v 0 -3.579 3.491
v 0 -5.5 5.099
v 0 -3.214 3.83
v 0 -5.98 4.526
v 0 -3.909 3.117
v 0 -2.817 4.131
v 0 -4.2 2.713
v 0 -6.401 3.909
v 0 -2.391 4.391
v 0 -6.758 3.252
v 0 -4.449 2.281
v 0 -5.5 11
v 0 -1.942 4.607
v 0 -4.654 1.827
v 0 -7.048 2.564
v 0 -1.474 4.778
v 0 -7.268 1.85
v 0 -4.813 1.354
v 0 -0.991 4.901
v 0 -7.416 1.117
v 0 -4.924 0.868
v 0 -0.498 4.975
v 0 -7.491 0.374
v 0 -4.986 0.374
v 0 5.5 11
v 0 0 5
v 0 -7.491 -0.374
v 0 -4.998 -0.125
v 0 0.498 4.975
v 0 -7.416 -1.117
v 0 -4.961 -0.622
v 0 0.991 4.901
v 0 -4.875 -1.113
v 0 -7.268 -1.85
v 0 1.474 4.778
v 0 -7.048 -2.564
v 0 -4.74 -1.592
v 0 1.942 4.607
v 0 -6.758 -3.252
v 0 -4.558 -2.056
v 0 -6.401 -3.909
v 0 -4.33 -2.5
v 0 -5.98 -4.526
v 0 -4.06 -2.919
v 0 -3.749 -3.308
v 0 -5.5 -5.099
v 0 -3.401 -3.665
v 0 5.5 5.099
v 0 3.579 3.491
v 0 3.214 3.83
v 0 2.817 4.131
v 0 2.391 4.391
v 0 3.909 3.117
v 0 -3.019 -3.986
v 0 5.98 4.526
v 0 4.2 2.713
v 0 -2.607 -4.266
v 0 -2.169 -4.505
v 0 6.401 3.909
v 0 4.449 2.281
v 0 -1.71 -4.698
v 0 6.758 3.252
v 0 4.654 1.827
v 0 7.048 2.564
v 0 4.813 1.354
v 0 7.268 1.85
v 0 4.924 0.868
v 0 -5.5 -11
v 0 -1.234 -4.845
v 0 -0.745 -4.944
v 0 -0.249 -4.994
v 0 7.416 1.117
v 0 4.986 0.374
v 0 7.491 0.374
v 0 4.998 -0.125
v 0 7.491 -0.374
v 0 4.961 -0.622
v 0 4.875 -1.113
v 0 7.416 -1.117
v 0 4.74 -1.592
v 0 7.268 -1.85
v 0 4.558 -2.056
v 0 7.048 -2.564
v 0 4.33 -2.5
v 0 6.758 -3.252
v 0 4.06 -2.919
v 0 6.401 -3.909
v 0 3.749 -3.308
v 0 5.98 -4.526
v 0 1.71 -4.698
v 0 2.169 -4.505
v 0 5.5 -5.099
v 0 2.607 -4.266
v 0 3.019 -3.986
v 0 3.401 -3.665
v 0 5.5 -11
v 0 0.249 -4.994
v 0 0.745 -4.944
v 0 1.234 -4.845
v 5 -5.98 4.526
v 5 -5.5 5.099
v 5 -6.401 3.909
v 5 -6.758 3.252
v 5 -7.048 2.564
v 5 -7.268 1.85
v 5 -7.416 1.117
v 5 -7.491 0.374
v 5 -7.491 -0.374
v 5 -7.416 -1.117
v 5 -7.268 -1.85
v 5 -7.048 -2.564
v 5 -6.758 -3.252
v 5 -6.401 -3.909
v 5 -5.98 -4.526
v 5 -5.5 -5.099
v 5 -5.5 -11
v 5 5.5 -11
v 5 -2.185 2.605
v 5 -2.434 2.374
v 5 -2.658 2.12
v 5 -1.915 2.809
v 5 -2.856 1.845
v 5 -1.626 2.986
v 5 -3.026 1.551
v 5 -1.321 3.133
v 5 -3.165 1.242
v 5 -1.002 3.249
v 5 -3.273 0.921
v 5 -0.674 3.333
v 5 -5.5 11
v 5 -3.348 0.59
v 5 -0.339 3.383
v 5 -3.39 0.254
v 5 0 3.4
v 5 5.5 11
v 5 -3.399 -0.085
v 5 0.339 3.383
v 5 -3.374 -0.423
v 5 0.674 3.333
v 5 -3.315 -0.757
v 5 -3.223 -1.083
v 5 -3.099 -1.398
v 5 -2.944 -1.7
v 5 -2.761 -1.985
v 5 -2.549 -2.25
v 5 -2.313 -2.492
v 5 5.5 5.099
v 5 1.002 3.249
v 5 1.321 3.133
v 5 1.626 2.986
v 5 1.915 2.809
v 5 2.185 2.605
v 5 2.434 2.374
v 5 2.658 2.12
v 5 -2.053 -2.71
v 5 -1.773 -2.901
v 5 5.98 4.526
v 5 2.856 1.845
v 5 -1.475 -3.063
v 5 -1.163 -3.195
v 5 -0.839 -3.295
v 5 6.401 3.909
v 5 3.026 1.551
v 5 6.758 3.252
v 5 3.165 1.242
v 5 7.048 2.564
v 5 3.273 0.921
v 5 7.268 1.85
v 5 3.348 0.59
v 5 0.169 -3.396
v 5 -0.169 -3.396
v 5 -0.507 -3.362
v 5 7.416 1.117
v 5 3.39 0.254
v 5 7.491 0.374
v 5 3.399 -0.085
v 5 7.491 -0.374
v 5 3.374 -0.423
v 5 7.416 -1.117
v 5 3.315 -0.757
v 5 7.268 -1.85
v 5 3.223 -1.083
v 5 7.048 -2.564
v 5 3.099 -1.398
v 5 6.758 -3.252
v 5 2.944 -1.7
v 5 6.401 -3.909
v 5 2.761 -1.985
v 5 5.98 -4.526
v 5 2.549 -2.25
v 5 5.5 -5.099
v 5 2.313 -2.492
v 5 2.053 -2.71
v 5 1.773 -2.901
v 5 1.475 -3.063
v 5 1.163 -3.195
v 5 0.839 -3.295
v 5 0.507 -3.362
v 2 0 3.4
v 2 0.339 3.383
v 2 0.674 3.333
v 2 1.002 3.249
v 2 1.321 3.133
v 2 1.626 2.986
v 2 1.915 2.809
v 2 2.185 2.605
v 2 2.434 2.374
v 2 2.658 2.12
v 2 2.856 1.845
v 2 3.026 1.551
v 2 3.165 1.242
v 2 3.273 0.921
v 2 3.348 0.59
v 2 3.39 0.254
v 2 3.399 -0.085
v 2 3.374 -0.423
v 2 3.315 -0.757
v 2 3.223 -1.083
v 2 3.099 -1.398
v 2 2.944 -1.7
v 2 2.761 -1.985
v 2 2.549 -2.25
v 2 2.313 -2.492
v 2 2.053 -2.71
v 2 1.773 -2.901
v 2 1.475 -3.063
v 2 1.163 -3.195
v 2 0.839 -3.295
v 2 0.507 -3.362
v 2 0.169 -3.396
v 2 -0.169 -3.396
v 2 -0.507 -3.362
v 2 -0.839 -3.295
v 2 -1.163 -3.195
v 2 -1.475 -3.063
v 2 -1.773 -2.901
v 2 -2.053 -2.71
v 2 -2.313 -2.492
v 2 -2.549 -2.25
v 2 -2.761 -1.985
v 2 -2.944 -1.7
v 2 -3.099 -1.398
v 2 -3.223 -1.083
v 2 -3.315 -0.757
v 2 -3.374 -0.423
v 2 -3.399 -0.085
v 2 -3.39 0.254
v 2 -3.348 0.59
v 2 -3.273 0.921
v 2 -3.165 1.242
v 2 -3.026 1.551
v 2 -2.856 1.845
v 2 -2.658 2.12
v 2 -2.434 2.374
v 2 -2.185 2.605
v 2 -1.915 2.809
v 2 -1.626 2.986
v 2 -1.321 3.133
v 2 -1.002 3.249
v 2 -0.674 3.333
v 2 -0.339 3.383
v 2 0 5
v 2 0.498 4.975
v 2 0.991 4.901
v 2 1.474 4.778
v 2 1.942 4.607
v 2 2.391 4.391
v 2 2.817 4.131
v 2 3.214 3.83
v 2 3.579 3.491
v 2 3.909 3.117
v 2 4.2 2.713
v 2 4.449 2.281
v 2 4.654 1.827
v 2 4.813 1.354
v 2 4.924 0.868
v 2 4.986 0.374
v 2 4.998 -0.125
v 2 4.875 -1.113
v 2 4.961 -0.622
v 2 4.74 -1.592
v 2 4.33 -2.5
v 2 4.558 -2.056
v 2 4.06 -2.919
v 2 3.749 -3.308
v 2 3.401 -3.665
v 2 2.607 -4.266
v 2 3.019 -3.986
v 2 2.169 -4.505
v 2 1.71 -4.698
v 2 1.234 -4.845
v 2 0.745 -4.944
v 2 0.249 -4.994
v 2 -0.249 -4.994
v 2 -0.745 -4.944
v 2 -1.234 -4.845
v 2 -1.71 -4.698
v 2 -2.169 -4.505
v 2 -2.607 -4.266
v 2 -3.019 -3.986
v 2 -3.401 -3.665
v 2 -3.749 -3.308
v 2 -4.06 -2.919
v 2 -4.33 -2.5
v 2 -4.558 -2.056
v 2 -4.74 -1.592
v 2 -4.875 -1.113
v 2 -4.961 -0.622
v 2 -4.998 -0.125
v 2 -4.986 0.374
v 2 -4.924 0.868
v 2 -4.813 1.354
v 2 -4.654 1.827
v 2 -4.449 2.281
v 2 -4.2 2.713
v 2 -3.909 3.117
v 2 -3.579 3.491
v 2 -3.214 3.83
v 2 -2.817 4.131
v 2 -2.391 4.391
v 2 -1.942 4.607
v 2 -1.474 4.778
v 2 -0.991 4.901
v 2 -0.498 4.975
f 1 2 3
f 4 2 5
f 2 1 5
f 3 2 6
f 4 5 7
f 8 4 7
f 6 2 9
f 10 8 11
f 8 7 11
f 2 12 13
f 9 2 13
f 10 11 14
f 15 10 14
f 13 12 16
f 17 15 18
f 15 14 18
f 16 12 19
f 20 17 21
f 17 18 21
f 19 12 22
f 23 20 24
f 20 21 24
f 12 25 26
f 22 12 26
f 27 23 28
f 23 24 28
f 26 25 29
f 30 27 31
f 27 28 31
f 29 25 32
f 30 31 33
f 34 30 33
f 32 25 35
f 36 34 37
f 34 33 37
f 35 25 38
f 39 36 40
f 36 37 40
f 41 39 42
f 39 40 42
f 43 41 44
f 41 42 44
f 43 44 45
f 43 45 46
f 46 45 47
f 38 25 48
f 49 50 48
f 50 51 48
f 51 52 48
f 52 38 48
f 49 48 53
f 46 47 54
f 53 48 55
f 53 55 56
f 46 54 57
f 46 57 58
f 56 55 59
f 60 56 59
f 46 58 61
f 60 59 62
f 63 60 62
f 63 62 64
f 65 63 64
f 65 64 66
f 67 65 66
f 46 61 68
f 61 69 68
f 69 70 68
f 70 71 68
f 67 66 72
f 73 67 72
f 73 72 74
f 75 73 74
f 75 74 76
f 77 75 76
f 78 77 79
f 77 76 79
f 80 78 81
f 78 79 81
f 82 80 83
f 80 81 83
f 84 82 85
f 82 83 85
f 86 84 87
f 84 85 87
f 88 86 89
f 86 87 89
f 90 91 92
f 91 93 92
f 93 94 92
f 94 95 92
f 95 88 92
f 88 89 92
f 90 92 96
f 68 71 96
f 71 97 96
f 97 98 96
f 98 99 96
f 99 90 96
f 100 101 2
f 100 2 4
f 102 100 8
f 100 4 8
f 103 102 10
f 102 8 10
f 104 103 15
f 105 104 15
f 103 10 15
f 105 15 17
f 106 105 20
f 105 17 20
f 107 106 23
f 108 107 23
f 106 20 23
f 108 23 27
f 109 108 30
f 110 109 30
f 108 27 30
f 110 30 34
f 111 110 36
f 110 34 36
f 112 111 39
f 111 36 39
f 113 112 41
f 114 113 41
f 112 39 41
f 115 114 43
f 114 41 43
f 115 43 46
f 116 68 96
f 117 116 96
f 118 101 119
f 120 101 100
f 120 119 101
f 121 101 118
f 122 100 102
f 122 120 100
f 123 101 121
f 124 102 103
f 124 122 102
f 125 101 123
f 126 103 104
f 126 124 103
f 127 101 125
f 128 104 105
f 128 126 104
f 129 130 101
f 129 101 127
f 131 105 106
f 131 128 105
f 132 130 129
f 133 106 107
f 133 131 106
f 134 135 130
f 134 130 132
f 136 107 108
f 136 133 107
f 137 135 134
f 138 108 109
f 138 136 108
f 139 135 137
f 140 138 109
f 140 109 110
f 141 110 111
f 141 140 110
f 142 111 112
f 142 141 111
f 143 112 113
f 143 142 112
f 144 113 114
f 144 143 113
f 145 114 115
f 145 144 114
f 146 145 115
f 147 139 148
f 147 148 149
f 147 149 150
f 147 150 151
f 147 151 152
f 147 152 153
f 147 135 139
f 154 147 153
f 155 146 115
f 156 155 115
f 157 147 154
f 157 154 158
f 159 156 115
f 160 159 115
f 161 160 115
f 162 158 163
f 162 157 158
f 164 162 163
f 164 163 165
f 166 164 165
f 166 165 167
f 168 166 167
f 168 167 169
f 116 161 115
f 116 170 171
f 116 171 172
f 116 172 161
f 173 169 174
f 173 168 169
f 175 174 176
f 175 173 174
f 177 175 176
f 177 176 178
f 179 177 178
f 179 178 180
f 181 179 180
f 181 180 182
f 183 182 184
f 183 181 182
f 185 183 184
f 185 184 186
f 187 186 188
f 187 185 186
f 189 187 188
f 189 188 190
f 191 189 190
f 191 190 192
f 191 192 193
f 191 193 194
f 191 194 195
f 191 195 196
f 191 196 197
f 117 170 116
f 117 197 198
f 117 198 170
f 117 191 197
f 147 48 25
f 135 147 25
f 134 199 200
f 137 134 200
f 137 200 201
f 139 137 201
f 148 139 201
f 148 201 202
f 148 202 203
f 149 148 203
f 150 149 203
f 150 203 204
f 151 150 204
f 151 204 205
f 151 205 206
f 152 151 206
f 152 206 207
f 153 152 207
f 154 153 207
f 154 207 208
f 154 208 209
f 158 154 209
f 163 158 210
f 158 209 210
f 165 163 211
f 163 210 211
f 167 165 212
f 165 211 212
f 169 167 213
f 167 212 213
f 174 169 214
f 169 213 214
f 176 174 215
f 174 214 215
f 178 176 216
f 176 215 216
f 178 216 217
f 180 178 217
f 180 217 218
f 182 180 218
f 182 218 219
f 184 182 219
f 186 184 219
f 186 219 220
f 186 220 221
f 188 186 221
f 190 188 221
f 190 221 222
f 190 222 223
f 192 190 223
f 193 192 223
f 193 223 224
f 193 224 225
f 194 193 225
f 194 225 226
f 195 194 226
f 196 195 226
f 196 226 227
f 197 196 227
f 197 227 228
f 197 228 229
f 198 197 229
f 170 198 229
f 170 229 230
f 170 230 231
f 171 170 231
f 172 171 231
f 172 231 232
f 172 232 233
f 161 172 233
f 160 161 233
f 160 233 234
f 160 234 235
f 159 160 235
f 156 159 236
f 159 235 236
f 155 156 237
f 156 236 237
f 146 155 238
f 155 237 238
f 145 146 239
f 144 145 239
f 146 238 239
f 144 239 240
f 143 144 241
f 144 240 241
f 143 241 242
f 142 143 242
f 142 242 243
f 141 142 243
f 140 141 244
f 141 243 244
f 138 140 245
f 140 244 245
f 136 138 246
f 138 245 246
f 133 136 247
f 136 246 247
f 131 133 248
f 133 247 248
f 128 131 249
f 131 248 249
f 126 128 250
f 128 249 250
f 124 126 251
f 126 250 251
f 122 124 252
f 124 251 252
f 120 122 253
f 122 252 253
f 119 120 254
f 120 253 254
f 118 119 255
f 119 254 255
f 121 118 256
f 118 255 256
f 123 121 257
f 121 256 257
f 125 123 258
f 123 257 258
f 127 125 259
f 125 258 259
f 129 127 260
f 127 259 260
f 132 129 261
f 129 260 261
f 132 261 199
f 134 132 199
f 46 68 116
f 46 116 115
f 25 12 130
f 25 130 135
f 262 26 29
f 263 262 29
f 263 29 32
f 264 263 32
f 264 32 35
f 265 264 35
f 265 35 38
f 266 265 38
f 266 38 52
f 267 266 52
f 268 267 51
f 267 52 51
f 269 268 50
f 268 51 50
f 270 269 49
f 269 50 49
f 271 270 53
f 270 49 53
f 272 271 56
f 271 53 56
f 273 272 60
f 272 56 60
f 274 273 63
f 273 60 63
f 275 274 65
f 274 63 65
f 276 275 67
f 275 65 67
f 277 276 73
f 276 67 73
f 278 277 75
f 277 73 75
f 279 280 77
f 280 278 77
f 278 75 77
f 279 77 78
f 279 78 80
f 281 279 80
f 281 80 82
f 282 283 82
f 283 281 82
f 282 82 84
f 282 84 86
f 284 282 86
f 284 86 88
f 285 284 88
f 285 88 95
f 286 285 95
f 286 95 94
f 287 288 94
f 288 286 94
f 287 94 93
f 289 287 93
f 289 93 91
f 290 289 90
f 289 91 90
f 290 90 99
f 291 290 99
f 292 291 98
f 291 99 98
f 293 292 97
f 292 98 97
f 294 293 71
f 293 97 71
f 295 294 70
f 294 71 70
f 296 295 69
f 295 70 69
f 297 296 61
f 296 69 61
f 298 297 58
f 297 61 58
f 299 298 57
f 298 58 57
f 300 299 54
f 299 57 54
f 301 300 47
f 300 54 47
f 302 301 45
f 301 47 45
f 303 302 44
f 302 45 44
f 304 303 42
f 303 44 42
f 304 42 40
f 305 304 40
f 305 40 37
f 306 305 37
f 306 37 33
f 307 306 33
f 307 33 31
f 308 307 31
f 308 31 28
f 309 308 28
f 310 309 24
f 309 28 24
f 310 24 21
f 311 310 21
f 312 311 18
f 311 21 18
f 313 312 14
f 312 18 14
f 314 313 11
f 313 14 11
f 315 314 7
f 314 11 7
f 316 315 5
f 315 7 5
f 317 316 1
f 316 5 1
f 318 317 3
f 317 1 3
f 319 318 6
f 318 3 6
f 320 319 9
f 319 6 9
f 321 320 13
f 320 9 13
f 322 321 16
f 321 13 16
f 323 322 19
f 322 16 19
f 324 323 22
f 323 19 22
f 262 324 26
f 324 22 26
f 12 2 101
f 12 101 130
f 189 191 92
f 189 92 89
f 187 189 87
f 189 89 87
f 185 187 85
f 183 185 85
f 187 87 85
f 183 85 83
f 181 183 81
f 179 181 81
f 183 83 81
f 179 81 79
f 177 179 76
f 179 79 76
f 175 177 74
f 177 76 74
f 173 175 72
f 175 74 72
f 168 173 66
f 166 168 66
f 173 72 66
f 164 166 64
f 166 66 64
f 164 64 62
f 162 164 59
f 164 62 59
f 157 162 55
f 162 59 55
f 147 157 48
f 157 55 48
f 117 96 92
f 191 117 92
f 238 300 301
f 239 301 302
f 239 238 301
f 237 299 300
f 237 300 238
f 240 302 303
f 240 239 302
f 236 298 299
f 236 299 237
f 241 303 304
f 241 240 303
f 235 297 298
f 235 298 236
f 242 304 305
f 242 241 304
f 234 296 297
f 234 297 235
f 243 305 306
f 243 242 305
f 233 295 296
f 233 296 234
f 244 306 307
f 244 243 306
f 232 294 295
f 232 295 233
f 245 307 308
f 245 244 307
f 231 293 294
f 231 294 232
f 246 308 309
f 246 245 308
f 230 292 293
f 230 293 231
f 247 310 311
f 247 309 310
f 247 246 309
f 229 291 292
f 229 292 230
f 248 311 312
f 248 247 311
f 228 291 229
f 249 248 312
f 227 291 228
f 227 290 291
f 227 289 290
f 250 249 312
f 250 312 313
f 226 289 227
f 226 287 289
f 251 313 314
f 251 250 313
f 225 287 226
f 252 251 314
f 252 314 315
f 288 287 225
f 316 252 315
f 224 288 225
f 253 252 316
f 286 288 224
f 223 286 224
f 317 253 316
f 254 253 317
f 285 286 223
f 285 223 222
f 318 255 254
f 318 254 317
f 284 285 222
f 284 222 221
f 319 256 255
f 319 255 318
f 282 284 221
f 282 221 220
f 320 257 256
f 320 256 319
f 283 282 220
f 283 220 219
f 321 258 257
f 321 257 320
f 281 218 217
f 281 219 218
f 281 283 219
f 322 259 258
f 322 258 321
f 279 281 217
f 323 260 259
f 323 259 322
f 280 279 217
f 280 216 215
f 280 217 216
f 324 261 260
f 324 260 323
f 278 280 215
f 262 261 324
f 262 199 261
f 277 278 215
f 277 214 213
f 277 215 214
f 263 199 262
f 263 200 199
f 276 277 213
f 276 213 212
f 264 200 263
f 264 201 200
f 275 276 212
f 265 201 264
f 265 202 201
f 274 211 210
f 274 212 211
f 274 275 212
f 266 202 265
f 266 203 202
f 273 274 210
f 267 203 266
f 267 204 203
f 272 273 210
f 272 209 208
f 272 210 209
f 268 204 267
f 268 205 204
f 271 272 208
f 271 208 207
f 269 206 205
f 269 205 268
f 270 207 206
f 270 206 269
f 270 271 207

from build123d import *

# Parameters (mm, degrees)
SKETCH_1_R          = 7.5
EXTRUDE_1_DEPTH     = 5
SKETCH_2_R          = 5
CUT_EXTRUDE_1_DEPTH = 2
SKETCH_3_R          = 3.4
CUT_EXTRUDE_2_DEPTH = 12.022703843
SKETCH_4_W          = 6
SKETCH_4_H          = 11
EXTRUDE_2_DEPTH     = 5


with BuildPart() as part:
    # 草图1 → 凸台-拉伸1 (new body)
    with BuildSketch(Plane(origin=(0, 0, 0), x_dir=(0, 0, -1), z_dir=(1, 0, 0))):
        Circle(SKETCH_1_R)
    extrude(amount=EXTRUDE_1_DEPTH)

    # 草图2 → 切除-拉伸1 (cut)
    with BuildSketch(Plane.ZY):
        Circle(SKETCH_2_R)
    extrude(amount=-CUT_EXTRUDE_1_DEPTH, mode=Mode.SUBTRACT)

    # 草图3 → 切除-拉伸2 (cut, through all)
    with BuildSketch(Plane.ZY.offset(-2)):
        Circle(SKETCH_3_R)
    extrude(amount=-CUT_EXTRUDE_2_DEPTH, mode=Mode.SUBTRACT)

    # 草图4 → 凸台-拉伸2 (add)
    with BuildSketch(Plane.ZY):
        with Locations((8, 0)):
            Rectangle(SKETCH_4_W, SKETCH_4_H)
        with Locations((-8, 0)):
            Rectangle(SKETCH_4_W, SKETCH_4_H)
    extrude(amount=-EXTRUDE_2_DEPTH)


solid = part.part
